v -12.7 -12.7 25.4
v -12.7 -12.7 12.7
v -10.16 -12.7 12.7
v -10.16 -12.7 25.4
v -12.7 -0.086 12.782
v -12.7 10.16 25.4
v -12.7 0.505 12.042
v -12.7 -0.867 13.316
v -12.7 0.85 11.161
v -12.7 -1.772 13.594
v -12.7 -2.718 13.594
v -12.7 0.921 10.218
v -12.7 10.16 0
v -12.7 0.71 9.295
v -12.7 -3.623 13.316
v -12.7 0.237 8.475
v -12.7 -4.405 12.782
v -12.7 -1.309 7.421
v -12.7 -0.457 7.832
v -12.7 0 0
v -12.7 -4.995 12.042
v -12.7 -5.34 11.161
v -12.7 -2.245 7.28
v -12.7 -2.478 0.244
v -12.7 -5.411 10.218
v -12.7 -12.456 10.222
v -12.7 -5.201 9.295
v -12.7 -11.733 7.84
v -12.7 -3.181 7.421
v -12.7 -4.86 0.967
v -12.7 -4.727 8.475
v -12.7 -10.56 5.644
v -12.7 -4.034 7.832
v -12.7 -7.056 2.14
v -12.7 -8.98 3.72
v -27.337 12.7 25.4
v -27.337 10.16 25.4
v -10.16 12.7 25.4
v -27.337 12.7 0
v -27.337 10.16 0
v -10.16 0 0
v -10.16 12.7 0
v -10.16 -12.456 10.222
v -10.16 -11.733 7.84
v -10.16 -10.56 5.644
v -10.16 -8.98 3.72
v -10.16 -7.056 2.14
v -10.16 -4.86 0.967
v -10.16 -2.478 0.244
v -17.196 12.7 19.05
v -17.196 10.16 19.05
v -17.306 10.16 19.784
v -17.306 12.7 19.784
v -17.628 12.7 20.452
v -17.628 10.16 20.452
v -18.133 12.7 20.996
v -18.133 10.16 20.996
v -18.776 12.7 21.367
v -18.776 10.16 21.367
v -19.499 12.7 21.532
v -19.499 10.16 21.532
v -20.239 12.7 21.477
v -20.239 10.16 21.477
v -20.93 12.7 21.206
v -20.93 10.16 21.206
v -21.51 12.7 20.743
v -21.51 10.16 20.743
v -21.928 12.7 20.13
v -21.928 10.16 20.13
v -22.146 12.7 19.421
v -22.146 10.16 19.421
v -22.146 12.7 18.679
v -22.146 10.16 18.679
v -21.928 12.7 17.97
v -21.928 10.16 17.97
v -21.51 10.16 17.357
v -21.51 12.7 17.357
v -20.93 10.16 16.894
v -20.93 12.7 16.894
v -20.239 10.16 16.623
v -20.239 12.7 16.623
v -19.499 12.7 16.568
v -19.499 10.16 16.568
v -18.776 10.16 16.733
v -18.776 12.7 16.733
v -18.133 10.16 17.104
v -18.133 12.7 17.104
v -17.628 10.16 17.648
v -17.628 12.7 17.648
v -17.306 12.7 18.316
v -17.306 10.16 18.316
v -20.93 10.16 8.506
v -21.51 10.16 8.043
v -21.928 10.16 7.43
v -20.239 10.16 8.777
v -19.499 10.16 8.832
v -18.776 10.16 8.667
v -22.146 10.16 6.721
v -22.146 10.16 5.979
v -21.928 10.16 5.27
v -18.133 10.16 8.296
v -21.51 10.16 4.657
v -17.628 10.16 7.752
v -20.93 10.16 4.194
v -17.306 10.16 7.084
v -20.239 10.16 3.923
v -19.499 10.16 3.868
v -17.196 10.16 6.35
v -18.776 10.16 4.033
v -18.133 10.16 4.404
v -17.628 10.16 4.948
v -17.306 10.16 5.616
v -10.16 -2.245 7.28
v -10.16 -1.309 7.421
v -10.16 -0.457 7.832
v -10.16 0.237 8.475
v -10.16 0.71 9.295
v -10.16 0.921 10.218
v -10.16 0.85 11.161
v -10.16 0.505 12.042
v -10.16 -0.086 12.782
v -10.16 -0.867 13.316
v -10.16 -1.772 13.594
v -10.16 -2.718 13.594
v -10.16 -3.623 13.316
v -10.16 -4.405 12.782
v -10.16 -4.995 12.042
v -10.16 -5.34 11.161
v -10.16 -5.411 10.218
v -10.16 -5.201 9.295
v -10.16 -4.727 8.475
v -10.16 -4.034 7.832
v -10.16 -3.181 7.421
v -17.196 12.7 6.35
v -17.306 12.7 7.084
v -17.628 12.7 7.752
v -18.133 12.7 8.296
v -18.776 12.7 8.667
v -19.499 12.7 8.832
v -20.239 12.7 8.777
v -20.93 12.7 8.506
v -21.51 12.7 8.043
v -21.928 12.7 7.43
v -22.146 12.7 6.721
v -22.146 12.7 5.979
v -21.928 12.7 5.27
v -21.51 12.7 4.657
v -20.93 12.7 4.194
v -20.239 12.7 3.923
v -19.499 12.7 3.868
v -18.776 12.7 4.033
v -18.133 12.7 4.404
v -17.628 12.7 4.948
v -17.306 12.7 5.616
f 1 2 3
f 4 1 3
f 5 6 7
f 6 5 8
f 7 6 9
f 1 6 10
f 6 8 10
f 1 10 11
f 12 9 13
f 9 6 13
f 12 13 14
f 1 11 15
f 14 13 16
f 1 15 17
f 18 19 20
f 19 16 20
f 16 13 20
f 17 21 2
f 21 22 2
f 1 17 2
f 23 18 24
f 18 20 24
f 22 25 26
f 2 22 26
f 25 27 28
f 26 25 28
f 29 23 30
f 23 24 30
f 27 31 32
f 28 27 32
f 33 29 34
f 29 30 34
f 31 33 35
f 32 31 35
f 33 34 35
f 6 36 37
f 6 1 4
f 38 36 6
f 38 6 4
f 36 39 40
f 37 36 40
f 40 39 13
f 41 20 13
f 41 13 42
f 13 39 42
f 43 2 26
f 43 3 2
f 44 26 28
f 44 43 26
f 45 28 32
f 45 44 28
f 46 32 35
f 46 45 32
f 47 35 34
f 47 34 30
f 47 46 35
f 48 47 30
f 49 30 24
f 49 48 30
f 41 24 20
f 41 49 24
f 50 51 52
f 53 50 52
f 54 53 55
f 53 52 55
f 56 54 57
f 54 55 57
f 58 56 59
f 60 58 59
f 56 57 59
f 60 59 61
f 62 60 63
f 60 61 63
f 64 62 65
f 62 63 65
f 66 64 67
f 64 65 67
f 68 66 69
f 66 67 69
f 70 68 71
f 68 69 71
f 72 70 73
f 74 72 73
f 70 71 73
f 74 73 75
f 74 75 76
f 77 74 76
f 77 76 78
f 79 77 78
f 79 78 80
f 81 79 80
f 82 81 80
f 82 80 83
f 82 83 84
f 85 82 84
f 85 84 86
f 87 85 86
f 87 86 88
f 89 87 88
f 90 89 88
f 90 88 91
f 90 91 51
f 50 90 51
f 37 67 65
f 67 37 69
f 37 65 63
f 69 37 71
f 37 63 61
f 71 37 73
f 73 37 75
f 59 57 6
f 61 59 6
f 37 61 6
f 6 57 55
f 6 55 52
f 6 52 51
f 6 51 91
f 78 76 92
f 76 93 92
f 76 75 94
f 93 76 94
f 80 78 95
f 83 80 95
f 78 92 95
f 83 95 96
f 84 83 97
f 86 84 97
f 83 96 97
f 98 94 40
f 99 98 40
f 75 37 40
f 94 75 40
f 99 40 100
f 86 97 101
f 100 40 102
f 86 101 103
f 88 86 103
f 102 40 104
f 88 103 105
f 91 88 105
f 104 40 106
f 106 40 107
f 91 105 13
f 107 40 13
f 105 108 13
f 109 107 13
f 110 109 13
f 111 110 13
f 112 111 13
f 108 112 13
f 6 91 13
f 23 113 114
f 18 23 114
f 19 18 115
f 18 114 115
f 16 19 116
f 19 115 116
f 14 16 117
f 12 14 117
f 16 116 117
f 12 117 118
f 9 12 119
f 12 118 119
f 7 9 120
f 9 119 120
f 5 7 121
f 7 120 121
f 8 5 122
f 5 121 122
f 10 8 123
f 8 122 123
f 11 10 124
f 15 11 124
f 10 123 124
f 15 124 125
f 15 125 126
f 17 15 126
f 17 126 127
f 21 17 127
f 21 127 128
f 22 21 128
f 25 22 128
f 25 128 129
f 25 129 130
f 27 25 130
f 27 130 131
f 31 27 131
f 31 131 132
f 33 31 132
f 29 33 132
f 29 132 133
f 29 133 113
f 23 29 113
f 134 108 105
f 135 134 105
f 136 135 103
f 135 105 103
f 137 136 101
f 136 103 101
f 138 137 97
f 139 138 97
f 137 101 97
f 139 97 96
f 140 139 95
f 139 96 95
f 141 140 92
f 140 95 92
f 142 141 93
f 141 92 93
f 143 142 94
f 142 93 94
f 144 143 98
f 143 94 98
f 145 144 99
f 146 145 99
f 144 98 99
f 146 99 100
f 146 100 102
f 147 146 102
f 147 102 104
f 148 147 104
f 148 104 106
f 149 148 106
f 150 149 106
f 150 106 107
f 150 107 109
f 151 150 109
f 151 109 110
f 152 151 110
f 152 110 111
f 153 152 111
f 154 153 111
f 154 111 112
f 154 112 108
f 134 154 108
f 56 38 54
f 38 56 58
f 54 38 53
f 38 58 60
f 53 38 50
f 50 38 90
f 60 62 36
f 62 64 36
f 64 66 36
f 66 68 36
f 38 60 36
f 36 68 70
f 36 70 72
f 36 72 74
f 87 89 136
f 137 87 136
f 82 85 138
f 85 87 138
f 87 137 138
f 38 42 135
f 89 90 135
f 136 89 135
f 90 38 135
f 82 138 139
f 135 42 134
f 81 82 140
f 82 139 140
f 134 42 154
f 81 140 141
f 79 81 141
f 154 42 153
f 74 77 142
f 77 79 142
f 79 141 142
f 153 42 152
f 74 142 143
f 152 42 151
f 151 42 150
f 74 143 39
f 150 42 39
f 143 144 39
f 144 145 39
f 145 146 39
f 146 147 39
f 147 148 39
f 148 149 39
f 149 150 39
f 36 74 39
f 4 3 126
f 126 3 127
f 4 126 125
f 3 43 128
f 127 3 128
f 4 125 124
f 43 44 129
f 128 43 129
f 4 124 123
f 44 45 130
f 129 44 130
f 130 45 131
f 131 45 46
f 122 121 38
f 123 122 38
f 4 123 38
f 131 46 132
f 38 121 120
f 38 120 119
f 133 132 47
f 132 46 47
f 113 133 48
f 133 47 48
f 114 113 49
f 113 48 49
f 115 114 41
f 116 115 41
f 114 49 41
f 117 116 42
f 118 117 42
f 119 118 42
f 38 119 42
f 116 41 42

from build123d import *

# Parameters (mm, degrees)
BOSS_EXTRUDE1_DEPTH = 25.4
FILLET1_R           = 12.7
SKETCH2_R           = 3.175
CUT_EXTRUDE1_DEPTH  = 18.17675
SKETCH3_R           = 2.4892
CUT_EXTRUDE2_DEPTH  = 3.54


with BuildPart() as part:
    # Sketch1 → Boss-Extrude1 (new body)
    with BuildSketch(Plane.XY):
        Polygon((-10.16, -12.7), (-10.16, 12.7), (-27.33675, 12.7), (-27.33675, 10.16), (-12.7, 10.16), (-12.7, -12.7), align=None)
    extrude(amount=BOSS_EXTRUDE1_DEPTH)

    # Fillet1
    fillet1_edges = [part.edges().sort_by_distance(p)[0] for p in [
        (-11.43, -12.7, 0),
    ]]
    fillet(fillet1_edges, radius=FILLET1_R)

    # Sketch2 → Cut-Extrude1 (cut, through all)
    with BuildSketch(Plane(origin=(-10.16, 0, 0), x_dir=(0, 0, -1), z_dir=(1, 0, 0))):
        with Locations((-10.45493597, -2.24506403)):
            Circle(SKETCH2_R)
    extrude(amount=-CUT_EXTRUDE1_DEPTH, mode=Mode.SUBTRACT)

    # Sketch3 → Cut-Extrude2 (cut, through all)
    with BuildSketch(Plane(origin=(-0.012018133, 10.16, 0), x_dir=(1, 0, 0), z_dir=(0, -1, 0))):
        with Locations((-19.672981867, 19.05)):
            Circle(SKETCH3_R)
        with Locations((-19.672981867, 6.35)):
            Circle(SKETCH3_R)
    extrude(amount=-CUT_EXTRUDE2_DEPTH, mode=Mode.SUBTRACT)


solid = part.part
